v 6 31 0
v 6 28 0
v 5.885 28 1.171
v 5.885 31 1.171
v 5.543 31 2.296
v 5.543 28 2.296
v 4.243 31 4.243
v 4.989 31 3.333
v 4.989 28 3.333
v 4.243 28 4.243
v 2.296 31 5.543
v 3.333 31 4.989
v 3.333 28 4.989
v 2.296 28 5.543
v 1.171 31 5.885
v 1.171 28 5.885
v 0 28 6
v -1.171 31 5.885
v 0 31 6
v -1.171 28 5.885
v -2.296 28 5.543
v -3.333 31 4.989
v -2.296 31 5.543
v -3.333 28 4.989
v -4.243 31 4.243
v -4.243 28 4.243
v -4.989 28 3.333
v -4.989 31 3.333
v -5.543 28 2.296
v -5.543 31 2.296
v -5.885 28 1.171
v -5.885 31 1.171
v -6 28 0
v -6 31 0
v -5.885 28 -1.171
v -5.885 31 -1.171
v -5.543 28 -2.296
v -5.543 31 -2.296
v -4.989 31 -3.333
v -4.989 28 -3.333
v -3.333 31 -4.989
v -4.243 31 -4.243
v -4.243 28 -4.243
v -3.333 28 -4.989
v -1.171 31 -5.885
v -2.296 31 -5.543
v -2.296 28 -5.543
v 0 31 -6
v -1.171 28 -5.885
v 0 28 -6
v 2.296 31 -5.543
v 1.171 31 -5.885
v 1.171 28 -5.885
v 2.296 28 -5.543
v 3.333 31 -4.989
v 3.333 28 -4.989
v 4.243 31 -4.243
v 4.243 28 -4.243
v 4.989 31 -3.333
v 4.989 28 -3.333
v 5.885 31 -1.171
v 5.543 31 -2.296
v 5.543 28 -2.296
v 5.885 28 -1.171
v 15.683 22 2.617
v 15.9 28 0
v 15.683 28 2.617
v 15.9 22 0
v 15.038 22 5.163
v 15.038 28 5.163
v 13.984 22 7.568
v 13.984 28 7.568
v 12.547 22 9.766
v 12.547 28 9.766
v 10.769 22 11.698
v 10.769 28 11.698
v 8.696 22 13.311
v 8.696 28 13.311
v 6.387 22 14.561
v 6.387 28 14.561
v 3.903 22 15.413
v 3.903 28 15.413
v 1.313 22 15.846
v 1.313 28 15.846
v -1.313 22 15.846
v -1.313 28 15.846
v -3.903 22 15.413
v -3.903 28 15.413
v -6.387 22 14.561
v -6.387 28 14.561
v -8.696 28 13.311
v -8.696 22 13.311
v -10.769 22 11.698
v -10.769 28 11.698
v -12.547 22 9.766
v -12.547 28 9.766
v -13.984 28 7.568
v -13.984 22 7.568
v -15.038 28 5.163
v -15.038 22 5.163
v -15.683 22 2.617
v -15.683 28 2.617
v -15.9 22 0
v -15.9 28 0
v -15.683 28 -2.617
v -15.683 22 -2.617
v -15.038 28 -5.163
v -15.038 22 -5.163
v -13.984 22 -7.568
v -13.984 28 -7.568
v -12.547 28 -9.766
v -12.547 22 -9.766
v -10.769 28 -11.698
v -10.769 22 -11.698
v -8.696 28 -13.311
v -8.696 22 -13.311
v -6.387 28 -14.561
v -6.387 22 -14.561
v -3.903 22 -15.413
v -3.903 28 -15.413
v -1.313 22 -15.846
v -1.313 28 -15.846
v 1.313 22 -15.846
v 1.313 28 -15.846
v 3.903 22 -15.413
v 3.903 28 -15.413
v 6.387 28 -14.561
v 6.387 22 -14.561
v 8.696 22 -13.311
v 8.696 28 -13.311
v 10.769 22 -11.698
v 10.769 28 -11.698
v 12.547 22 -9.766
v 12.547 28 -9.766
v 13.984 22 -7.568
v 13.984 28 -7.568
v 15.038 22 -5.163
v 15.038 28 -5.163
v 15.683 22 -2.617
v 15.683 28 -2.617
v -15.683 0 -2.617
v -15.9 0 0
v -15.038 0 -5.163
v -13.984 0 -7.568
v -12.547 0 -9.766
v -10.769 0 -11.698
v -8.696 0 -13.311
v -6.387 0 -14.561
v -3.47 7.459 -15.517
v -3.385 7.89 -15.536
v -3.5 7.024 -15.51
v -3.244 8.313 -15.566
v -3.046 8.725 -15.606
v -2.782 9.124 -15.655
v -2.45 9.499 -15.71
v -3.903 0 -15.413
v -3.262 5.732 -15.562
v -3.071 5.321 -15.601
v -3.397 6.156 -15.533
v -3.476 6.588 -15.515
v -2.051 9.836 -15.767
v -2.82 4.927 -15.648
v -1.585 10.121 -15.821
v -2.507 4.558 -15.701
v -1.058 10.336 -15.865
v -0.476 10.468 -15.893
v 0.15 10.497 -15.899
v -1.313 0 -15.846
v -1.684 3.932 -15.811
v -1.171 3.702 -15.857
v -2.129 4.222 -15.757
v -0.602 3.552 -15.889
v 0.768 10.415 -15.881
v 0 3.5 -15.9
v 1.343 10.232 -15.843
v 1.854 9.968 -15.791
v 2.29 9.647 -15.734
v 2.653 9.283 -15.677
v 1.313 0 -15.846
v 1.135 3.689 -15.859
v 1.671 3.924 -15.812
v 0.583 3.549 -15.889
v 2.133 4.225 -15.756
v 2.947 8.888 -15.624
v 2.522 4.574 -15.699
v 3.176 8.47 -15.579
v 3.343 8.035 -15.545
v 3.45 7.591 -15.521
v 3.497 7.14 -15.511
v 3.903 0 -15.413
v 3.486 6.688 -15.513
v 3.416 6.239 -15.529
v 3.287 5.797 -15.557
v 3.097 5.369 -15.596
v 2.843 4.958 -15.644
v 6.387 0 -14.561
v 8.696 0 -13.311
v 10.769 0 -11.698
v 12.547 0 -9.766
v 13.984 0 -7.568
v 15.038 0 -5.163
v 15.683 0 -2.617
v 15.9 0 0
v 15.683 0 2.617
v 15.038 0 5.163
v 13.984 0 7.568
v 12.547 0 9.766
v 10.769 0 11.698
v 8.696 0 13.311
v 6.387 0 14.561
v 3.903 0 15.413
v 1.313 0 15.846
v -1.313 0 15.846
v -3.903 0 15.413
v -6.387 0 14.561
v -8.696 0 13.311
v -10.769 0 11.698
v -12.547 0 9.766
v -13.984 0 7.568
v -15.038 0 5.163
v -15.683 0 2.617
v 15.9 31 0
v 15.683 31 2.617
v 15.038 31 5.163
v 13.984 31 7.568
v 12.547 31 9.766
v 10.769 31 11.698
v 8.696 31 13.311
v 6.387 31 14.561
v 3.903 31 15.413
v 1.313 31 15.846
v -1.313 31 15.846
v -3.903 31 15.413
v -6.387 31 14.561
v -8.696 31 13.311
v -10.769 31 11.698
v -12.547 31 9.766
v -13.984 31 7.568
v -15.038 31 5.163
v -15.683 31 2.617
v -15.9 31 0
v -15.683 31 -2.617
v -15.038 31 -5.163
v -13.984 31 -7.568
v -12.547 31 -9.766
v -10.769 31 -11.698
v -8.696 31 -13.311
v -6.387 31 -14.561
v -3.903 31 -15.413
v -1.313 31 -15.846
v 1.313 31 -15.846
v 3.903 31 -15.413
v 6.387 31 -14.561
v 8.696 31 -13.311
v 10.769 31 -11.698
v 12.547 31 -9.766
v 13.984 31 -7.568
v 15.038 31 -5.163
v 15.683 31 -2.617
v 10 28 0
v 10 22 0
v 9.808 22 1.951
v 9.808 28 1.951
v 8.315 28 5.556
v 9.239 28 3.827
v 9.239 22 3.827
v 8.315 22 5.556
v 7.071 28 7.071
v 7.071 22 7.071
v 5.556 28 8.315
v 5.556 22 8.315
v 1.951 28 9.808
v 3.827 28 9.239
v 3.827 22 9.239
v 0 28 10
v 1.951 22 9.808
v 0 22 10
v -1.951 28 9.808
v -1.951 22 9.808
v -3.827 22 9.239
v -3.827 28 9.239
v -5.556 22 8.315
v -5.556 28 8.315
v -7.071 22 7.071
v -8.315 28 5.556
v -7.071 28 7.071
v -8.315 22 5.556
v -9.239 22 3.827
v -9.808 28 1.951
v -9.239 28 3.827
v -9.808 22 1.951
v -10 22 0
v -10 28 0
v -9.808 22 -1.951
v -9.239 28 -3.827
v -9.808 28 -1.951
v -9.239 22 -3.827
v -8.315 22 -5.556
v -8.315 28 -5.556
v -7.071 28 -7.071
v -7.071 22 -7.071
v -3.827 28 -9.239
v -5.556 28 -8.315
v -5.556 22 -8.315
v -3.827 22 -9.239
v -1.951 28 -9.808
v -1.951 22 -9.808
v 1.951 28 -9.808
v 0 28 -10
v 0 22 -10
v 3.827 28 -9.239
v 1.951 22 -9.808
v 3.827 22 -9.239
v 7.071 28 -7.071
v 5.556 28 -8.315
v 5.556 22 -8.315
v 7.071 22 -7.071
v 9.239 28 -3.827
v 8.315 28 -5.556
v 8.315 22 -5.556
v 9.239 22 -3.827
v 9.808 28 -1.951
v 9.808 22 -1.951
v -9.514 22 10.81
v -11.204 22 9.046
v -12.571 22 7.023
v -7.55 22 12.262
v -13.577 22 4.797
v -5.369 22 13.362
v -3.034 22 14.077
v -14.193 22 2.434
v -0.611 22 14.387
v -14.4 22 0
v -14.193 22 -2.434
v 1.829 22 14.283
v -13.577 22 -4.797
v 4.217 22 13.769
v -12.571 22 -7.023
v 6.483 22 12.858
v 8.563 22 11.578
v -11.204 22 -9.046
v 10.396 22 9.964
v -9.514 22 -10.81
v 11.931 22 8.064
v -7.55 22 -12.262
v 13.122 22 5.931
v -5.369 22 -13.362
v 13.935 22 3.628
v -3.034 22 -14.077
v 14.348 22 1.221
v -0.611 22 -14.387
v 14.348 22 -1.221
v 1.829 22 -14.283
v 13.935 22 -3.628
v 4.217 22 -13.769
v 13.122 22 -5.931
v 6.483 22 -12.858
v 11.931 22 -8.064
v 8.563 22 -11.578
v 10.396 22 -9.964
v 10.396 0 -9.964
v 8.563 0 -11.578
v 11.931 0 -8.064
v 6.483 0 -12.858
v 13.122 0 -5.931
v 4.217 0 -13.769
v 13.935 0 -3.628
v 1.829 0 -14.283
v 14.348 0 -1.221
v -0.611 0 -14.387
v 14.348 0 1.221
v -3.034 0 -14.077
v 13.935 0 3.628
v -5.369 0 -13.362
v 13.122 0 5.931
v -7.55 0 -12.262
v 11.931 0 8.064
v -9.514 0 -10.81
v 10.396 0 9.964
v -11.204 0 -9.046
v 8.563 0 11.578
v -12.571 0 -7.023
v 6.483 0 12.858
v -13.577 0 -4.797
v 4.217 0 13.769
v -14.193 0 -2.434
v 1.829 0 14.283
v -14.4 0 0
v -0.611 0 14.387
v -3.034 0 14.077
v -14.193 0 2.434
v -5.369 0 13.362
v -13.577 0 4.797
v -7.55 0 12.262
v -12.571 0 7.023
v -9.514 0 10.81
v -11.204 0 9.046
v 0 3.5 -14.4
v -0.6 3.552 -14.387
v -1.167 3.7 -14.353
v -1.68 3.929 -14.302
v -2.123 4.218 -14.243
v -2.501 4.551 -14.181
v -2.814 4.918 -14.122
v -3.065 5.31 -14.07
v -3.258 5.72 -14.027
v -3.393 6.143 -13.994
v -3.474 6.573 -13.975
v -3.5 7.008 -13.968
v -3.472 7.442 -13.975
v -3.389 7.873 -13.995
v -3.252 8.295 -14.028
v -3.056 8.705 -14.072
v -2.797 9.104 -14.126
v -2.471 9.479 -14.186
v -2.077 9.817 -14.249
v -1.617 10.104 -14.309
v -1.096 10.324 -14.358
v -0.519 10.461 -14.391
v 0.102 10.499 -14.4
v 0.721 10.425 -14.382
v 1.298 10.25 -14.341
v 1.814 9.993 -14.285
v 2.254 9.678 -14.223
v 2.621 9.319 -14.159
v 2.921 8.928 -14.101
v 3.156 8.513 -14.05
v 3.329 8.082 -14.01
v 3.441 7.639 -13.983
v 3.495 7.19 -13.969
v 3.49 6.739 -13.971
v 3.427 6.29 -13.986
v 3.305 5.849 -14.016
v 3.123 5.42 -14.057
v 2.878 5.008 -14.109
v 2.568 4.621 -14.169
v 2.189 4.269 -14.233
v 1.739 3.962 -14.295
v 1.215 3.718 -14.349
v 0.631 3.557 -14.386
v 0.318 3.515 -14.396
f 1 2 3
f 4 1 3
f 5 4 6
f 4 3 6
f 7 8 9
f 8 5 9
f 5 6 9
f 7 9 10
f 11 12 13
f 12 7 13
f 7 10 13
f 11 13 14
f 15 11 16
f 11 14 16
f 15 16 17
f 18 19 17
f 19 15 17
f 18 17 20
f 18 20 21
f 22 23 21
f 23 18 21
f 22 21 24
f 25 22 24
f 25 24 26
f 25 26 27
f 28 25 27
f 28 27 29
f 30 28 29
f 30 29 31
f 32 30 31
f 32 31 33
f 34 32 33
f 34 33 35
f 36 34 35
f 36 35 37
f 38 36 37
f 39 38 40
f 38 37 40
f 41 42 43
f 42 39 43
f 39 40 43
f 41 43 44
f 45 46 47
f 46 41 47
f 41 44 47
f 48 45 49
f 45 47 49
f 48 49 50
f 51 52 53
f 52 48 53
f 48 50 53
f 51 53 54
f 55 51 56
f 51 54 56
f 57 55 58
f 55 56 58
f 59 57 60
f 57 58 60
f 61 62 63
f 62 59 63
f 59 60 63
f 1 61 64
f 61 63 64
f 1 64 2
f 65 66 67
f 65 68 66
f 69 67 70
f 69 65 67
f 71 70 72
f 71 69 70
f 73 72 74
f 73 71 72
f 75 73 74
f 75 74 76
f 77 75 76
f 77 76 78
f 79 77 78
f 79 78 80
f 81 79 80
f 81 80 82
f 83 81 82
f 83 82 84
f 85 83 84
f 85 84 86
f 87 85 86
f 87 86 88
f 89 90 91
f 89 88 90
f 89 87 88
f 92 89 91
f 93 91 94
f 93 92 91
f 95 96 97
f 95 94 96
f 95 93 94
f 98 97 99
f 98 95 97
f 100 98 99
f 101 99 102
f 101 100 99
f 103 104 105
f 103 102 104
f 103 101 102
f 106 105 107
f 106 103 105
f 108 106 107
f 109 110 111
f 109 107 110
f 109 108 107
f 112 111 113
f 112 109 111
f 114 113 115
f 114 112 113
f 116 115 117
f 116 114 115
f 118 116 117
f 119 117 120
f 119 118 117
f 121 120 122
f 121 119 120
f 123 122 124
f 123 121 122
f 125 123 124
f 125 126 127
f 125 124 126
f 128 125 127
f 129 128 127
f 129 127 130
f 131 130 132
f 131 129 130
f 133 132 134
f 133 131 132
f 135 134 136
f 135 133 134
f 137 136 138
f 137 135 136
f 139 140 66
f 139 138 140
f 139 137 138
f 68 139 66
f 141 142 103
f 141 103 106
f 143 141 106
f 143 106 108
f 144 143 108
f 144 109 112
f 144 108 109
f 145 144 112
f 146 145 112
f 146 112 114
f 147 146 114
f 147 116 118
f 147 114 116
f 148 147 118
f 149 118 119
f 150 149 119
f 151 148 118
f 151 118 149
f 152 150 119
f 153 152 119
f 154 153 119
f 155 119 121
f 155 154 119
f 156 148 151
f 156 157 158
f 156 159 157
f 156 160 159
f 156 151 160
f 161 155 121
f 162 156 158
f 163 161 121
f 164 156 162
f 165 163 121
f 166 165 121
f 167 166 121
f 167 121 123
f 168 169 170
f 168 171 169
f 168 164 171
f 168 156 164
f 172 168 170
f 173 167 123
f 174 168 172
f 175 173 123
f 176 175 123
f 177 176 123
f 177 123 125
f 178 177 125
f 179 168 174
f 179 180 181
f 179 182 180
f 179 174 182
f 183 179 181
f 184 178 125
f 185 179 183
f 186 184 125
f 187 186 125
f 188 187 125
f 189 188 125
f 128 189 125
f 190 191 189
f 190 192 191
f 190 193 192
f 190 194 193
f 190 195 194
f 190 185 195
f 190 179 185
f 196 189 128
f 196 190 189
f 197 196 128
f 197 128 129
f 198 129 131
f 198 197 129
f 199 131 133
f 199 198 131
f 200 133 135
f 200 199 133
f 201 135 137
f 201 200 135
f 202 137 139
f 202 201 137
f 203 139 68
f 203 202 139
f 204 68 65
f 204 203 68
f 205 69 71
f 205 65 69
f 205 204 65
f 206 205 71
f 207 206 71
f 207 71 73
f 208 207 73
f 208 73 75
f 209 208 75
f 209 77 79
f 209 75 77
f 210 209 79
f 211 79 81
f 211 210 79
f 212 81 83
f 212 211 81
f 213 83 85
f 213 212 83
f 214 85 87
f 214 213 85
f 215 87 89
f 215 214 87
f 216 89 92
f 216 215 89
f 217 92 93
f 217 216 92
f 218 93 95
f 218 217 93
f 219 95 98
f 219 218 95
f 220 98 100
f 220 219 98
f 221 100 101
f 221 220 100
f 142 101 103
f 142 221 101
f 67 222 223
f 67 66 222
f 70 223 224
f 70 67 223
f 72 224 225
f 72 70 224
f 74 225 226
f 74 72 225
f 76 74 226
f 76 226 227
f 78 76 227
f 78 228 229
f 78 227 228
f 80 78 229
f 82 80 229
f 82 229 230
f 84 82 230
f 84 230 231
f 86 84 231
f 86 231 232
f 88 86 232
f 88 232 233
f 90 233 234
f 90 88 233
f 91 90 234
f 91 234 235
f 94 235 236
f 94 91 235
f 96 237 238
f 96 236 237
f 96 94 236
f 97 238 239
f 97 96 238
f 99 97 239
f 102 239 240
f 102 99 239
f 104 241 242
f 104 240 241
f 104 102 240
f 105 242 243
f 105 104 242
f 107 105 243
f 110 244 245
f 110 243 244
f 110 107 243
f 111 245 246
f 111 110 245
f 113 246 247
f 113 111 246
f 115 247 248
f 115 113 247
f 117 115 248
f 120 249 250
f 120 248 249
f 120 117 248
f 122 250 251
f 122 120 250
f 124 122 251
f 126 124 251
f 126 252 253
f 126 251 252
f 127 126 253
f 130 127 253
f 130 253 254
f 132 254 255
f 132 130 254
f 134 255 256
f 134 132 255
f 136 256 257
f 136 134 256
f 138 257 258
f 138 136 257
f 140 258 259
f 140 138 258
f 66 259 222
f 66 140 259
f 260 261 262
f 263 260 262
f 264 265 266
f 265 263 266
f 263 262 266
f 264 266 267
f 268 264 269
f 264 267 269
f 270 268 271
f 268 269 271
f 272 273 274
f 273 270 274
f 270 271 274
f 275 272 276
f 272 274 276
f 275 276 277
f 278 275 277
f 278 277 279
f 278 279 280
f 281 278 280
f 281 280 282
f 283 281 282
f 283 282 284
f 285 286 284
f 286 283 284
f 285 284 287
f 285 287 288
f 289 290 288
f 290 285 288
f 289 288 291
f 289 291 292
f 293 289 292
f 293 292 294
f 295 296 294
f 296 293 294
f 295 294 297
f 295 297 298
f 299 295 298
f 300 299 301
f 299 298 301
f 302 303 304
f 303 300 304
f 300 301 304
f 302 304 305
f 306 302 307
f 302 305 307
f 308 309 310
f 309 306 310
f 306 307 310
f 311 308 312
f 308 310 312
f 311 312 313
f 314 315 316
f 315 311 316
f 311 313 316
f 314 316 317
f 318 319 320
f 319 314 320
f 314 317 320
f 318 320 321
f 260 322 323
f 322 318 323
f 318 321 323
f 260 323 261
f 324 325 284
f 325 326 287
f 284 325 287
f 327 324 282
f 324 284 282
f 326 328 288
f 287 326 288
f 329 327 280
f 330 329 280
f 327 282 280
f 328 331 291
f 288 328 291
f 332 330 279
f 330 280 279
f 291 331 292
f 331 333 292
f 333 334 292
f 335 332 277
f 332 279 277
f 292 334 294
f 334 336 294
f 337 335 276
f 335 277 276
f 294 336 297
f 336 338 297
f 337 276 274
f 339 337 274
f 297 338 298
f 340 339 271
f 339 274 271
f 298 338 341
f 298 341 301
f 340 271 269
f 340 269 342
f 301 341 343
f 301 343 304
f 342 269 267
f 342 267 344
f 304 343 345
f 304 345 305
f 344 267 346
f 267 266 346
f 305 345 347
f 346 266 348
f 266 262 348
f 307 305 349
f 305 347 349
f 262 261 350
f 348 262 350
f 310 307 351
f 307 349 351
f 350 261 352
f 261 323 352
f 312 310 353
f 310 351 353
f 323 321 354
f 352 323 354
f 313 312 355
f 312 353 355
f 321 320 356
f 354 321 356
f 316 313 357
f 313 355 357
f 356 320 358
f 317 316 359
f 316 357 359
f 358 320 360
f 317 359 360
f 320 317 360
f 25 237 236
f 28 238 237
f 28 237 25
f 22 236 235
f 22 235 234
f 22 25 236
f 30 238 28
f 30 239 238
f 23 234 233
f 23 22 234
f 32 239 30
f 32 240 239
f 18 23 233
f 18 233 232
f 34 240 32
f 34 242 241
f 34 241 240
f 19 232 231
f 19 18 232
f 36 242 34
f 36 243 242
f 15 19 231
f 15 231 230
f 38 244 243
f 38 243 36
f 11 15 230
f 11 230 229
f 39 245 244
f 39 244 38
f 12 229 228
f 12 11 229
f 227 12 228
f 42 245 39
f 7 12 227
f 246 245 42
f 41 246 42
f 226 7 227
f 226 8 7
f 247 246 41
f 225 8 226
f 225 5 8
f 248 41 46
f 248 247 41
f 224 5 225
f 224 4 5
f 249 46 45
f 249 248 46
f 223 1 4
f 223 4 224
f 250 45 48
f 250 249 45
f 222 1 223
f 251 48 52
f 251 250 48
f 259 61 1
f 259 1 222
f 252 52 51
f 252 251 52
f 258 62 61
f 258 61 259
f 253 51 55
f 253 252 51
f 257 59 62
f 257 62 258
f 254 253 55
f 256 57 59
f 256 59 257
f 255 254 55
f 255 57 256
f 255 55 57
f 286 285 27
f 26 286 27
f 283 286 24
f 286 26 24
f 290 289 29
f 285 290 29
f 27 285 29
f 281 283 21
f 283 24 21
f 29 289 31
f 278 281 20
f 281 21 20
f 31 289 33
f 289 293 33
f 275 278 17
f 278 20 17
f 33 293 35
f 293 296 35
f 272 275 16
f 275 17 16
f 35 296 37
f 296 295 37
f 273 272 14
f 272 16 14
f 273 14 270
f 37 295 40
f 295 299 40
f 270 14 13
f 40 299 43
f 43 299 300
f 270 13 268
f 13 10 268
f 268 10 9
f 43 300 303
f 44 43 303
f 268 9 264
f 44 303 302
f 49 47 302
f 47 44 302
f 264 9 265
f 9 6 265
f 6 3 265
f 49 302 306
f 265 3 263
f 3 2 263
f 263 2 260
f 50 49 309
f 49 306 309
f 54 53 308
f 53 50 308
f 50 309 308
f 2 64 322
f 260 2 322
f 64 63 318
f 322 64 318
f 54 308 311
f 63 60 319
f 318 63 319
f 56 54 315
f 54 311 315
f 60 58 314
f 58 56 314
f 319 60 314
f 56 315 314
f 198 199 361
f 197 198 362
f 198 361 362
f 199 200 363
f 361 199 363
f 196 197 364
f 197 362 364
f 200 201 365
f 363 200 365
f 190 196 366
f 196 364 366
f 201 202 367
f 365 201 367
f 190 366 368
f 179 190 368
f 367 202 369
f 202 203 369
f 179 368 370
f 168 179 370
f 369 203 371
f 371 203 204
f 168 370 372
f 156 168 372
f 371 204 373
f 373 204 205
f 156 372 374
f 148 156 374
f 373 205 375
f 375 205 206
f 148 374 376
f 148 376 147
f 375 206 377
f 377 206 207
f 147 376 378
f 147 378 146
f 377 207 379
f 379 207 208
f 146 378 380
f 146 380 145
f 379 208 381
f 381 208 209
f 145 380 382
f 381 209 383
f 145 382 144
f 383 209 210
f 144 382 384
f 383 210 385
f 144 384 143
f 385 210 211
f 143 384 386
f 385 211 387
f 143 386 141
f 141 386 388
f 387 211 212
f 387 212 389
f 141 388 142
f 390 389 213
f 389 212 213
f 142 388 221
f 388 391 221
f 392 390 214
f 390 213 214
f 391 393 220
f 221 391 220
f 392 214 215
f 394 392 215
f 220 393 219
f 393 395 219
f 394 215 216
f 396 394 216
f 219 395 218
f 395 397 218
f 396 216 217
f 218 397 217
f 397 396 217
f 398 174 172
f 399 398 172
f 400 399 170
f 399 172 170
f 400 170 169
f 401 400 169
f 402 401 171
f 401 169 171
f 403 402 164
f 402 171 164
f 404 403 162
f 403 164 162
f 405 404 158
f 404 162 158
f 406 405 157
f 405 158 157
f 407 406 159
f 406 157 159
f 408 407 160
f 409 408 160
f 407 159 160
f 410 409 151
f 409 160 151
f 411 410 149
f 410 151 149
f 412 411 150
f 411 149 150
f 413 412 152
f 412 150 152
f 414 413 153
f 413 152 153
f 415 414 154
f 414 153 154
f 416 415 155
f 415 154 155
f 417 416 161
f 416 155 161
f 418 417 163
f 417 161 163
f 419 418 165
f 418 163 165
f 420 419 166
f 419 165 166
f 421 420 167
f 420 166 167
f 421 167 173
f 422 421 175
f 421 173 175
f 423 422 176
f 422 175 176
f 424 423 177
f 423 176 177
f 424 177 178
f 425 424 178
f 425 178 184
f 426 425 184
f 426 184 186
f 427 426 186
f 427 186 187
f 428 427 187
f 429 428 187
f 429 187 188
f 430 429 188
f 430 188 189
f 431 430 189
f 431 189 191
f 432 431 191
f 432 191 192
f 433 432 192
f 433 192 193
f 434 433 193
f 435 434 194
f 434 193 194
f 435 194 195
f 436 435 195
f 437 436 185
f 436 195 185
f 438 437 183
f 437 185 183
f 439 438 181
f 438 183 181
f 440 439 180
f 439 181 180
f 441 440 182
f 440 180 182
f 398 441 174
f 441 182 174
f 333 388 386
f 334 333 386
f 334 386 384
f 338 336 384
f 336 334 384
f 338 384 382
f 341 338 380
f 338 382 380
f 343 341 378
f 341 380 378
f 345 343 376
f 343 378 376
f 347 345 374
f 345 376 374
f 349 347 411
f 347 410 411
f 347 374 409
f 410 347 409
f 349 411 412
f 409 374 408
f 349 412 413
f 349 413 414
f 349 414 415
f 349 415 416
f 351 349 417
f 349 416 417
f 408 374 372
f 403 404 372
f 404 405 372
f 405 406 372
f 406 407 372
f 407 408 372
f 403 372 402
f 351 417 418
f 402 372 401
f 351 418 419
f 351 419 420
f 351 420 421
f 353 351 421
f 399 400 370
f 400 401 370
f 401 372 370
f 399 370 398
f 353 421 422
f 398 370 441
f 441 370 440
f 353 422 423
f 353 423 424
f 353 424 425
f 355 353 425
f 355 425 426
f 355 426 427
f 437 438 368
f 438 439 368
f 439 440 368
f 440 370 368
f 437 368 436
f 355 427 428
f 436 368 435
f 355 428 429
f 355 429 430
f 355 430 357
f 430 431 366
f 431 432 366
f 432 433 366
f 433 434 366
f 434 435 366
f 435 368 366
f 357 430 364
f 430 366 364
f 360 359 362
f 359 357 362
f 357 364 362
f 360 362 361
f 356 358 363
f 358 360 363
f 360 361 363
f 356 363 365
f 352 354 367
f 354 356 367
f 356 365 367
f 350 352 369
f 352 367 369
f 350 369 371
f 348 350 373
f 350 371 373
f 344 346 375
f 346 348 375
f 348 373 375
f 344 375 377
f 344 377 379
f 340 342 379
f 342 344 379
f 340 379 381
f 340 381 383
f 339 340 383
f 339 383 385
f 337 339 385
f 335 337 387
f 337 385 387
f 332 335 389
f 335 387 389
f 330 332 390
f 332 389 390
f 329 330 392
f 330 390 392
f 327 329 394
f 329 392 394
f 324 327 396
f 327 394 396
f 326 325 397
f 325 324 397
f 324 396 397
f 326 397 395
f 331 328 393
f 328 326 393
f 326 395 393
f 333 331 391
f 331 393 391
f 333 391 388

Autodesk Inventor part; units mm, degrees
ref_plane "YZ Plane" through (0, 0, 0) normal (1, 0, 0) x (0, 1, 0)
ref_plane "XZ Plane" through (0, 0, 0) normal (0, 1, 0) x (-1, 0, 0)
ref_plane "XY Plane" through (0, 0, 0) normal (0, 0, 1) x (1, 0, 0)
sketch "Boceto1" plane through (0, 0, 0) normal (0, 1, 0) x (-1, 0, 0)
  circle A0 centre (0, 0) radius 14.4
  circle A1 centre (0, 0) radius 15.9
  dimension "d0" = 28.8
  dimension "d1" = 1.5
extrude "Extrusión1" add sketch "Boceto1" along normal blind 22
sketch "Boceto2" plane through (0, 0, 0) normal (0, 0, 1) x (1, 0, 0)
  line L0 (15.9, 22) -> (-15.9, 22) projected
  point P0 (0, 0)
  point P1 (0, 7)
  dimension "d4" = 15
hole "Agujero1" at (0, 7, 0) direction (0, 0, -1) diameter 7 end through all clearance for "Tornillo para maquinaria de cabeza plana" size "M6" standard "Perfil M métrico ANSI"
sketch "Boceto3" plane through (0, 22, 0) normal (0, 1, 0) x (1, 0, 0)
  circle A0 centre (0, 0) radius 15.9 projected
  circle A1 centre (0, 0) radius 10
  dimension "d12" = 20
extrude "Extrusión2" add sketch "Boceto3" along normal blind 6
sketch "Boceto4" plane through (0, 28, 0) normal (0, 1, 0) x (1, 0, 0)
  circle A0 centre (0, 0) radius 15.9 projected
  circle A1 centre (0, 0) radius 6
  dimension "d15" = 12
extrude "Extrusión3" add sketch "Boceto4" along normal blind 3
properties part number "limite_3DPrint"
